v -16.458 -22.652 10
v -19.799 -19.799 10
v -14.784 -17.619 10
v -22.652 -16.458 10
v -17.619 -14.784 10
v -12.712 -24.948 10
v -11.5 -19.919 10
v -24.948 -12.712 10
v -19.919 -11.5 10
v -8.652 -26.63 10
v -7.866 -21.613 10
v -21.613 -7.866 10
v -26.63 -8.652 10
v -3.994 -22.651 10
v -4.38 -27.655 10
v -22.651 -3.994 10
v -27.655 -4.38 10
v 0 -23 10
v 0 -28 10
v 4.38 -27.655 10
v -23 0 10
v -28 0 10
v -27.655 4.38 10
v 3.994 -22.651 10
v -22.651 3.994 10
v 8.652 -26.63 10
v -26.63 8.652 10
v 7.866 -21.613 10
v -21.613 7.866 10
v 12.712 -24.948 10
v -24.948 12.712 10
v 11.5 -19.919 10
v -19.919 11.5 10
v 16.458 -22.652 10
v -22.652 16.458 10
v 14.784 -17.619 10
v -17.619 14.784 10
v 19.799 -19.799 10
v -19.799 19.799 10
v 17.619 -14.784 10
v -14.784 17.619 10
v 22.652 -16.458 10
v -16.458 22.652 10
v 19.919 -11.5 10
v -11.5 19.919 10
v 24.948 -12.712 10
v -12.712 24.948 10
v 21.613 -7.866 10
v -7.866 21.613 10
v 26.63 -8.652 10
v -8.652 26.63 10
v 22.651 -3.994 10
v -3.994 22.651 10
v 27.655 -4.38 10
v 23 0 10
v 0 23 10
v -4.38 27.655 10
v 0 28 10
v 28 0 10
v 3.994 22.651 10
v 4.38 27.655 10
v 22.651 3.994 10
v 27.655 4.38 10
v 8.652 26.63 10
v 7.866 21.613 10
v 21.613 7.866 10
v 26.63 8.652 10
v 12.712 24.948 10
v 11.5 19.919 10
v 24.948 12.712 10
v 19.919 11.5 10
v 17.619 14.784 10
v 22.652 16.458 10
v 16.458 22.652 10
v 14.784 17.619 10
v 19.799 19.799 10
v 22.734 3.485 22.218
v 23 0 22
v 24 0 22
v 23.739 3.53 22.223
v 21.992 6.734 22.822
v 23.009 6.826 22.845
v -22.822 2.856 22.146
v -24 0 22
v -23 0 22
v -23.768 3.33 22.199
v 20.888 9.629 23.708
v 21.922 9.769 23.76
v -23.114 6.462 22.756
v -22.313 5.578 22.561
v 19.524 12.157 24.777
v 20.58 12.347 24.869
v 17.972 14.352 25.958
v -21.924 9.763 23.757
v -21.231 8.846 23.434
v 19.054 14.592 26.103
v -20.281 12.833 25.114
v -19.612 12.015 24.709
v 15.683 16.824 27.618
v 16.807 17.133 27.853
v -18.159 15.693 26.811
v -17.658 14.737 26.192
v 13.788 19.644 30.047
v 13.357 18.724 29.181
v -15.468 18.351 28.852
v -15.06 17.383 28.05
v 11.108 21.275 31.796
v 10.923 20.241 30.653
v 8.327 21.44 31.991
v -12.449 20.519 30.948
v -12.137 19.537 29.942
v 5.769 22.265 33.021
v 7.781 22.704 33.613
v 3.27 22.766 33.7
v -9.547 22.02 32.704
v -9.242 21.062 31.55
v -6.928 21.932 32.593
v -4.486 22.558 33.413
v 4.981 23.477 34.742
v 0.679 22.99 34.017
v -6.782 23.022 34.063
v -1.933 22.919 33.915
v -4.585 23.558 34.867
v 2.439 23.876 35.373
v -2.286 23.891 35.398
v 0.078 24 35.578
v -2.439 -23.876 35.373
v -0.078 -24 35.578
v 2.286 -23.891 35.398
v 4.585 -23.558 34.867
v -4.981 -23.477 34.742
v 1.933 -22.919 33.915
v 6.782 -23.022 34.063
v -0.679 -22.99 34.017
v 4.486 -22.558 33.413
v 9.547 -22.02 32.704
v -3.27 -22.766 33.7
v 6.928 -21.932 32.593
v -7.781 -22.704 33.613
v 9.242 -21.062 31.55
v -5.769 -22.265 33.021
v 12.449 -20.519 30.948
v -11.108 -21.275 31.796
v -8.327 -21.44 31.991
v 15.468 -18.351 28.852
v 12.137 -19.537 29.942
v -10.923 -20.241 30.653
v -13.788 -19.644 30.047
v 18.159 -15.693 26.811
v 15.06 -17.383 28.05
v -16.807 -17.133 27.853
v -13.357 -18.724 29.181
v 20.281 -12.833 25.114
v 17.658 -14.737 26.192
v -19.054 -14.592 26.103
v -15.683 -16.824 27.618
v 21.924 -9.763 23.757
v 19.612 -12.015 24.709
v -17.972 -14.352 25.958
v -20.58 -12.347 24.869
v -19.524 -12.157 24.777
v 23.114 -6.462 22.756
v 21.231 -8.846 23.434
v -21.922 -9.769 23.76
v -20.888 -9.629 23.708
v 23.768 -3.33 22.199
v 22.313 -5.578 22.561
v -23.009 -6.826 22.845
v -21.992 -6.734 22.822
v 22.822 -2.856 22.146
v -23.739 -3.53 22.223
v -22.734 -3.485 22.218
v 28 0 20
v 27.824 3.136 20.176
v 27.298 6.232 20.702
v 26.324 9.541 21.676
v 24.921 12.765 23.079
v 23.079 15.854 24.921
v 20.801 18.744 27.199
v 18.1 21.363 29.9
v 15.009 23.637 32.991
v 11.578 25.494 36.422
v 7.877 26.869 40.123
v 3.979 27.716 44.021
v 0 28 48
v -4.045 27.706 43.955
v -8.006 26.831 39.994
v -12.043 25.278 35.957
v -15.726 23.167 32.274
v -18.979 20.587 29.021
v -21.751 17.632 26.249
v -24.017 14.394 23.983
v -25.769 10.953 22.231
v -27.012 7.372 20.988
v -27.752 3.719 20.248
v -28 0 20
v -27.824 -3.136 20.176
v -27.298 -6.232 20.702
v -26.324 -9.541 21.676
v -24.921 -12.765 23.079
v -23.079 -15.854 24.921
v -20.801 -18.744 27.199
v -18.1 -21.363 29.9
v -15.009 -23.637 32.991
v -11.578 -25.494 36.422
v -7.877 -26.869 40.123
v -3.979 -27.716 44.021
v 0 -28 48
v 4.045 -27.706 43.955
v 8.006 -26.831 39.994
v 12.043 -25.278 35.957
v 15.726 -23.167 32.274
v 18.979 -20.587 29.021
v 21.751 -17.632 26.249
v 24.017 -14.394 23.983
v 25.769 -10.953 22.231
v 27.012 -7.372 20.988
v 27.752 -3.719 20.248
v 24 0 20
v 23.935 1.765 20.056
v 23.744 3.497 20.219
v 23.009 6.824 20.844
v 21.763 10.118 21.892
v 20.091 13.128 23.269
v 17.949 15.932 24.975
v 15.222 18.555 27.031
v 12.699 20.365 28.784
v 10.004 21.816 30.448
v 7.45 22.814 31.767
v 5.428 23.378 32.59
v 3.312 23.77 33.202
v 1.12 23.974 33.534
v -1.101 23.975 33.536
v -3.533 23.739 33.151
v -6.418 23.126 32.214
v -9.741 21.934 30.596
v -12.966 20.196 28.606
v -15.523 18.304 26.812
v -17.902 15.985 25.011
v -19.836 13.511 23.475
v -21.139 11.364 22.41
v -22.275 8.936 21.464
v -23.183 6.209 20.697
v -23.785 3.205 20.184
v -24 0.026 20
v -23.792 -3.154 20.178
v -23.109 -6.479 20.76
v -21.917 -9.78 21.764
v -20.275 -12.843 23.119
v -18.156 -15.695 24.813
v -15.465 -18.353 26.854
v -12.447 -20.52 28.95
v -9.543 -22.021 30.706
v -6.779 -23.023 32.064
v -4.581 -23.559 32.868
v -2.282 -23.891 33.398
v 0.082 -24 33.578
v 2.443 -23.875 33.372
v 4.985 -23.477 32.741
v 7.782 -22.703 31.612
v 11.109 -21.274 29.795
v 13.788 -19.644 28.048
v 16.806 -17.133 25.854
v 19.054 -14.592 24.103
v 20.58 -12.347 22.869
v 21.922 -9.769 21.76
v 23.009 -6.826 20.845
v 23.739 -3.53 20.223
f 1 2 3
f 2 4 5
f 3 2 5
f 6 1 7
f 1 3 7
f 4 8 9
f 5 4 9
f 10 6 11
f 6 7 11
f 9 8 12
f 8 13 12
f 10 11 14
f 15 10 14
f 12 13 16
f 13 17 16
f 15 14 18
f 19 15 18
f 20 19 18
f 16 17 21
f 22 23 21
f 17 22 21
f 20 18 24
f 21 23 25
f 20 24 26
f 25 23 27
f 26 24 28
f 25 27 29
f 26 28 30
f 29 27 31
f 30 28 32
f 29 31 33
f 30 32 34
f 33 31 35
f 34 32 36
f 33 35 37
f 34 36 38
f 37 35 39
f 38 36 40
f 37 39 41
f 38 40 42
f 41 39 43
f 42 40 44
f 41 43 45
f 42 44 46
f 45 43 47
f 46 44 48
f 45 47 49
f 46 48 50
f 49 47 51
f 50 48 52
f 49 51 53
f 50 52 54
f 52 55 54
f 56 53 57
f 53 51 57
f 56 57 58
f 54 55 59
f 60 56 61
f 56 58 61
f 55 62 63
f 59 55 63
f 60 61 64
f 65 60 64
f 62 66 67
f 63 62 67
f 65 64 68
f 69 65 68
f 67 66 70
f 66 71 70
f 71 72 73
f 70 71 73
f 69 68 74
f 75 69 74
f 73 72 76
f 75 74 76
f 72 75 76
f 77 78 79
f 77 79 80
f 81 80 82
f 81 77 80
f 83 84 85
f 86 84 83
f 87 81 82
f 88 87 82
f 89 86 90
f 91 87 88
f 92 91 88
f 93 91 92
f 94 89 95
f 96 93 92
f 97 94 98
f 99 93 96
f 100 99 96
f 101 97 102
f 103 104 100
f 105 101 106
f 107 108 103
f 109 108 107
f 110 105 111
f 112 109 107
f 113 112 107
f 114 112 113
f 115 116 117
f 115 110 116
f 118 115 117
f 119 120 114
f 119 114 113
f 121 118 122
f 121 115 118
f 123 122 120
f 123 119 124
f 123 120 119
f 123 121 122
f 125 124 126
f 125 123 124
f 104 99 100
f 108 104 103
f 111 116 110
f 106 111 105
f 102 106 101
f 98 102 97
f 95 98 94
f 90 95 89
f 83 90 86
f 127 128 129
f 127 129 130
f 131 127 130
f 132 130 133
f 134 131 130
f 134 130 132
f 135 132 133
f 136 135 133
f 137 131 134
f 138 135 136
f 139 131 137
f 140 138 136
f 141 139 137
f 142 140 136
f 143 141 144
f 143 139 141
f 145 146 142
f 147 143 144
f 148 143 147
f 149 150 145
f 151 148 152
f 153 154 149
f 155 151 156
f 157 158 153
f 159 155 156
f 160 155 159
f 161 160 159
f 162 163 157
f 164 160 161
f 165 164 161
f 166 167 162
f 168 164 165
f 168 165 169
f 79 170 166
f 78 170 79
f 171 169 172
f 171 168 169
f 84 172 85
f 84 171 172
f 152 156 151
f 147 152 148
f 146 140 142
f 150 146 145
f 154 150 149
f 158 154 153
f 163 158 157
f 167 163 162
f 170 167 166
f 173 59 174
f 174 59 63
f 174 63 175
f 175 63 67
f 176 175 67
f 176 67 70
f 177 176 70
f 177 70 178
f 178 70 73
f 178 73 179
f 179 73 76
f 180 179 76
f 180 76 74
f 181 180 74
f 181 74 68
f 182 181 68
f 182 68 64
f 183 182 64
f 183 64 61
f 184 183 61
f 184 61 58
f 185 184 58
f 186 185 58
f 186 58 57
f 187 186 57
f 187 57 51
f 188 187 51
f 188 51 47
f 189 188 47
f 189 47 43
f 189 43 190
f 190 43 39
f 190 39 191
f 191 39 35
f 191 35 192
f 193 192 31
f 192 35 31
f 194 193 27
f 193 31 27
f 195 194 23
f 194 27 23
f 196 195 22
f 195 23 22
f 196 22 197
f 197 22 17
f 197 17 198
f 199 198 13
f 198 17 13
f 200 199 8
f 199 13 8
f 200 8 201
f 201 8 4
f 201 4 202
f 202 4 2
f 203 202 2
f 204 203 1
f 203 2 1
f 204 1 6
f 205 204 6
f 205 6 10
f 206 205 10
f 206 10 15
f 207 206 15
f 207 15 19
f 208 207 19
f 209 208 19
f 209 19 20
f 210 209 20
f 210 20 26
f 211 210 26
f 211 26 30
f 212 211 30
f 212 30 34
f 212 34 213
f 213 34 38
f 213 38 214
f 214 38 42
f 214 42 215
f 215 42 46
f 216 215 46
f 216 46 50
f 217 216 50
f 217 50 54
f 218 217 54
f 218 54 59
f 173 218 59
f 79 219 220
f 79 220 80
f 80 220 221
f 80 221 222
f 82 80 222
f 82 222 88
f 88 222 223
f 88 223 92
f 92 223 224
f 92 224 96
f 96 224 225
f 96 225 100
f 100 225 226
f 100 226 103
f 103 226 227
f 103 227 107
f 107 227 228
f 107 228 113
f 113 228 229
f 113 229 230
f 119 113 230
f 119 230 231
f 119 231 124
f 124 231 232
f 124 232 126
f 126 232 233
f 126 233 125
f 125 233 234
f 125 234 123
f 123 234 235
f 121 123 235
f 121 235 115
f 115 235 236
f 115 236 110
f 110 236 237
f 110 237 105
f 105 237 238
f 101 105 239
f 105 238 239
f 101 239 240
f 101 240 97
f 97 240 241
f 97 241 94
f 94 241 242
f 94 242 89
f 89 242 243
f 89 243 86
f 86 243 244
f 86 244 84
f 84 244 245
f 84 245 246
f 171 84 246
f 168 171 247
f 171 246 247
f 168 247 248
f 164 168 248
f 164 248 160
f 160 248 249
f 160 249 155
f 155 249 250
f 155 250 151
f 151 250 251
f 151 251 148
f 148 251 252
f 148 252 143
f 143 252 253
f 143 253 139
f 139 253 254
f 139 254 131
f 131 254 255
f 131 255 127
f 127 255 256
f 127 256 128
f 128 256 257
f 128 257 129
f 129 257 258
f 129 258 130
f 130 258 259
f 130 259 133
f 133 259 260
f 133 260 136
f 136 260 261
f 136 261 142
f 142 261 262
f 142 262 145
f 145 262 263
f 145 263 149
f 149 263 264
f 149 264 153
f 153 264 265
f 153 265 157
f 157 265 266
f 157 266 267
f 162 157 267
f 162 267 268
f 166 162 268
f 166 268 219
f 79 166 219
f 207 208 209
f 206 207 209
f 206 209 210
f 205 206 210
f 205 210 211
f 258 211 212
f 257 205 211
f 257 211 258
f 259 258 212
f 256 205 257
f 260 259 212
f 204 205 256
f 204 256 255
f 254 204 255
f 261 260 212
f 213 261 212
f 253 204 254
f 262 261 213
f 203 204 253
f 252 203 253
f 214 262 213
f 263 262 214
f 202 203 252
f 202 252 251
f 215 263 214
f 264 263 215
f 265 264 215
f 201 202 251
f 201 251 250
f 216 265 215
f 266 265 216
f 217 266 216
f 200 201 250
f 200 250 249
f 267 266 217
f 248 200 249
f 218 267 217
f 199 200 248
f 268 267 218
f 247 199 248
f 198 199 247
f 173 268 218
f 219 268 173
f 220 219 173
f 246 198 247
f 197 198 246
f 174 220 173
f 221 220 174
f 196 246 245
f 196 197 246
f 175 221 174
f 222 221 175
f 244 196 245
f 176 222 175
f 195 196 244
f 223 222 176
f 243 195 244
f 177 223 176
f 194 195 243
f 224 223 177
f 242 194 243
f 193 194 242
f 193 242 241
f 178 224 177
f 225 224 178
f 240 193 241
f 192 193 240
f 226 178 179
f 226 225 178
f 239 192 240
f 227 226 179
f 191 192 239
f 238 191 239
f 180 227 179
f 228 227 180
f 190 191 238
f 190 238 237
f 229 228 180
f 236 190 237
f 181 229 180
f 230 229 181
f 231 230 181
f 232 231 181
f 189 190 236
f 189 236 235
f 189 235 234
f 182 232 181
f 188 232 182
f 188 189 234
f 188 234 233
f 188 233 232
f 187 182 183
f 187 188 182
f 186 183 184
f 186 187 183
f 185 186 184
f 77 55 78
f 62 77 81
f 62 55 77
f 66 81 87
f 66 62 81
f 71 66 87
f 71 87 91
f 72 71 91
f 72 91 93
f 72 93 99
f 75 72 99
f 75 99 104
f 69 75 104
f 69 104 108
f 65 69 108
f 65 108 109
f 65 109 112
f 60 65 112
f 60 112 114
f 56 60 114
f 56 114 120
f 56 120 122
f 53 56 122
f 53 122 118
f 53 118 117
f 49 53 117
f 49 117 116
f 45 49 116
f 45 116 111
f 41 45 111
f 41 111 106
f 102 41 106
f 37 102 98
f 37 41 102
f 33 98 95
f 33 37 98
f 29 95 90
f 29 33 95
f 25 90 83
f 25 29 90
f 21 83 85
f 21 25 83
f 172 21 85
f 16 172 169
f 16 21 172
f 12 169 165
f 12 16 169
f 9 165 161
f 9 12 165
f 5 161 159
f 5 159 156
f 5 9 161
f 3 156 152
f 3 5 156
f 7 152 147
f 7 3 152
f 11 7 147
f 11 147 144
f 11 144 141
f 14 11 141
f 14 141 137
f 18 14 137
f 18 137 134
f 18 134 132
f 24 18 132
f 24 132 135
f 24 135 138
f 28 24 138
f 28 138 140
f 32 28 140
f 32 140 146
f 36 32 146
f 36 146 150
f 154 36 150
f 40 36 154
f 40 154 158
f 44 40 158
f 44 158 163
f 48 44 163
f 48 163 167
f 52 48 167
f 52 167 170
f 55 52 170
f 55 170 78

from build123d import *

# Parameters (mm, degrees)
CYLINDER015_R     = 28
CYLINDER015_DEPTH = 61
CYLINDER014_R     = 23
CYLINDER014_DEPTH = 38
CYLINDER013_R     = 28
CYLINDER013_DEPTH = 38
CYLINDER017_R     = 28
CYLINDER017_DEPTH = 61
CYLINDER016_R     = 23
CYLINDER016_DEPTH = 40
CYLINDER018_R     = 24
CYLINDER018_DEPTH = 40


with BuildPart() as cylinder015:
    # Cylinder015 → Cylinder015 (new body)
    with BuildSketch(Plane(origin=(-29, 0, 38), x_dir=(0, 0, -1), z_dir=(1, 0, 0))):
        Circle(CYLINDER015_R)
    extrude(amount=CYLINDER015_DEPTH)


with BuildPart() as cylinder014:
    # Cylinder014 → Cylinder014 (new body)
    with BuildSketch(Plane.XY):
        Circle(CYLINDER014_R)
    extrude(amount=CYLINDER014_DEPTH)


with BuildPart() as cut013:
    # Cylinder013 → Cylinder013 (new body)
    with BuildSketch(Plane.XY):
        Circle(CYLINDER013_R)
    extrude(amount=CYLINDER013_DEPTH)

    # Cut012: cut Cylinder014
    add(cylinder014.part, mode=Mode.SUBTRACT)

    # Cut013: cut Cylinder015
    add(cylinder015.part, mode=Mode.SUBTRACT)


with BuildPart() as cylinder017:
    # Cylinder017 → Cylinder017 (new body)
    with BuildSketch(Plane(origin=(-29, 0, 40), x_dir=(0, 0, -1), z_dir=(1, 0, 0))):
        Circle(CYLINDER017_R)
    extrude(amount=CYLINDER017_DEPTH)


with BuildPart() as cylinder016:
    # Cylinder016 → Cylinder016 (new body)
    with BuildSketch(Plane.XY):
        Circle(CYLINDER016_R)
    extrude(amount=CYLINDER016_DEPTH)


with BuildPart() as fusion002:
    # Cylinder018 → Cylinder018 (new body)
    with BuildSketch(Plane.XY):
        Circle(CYLINDER018_R)
    extrude(amount=CYLINDER018_DEPTH)

    # Cut014: cut Cylinder016
    add(cylinder016.part, mode=Mode.SUBTRACT)

    # Cut015: cut Cylinder017
    add(cylinder017.part, mode=Mode.SUBTRACT)

    # Fusion002: union Cut013
    add(cut013.part)


with BuildPart() as fusion002_1:
    # Fusion002 placement: moved
    add(fusion002.part.moved(Location((0, 0, 10))))


solid = fusion002_1.part
